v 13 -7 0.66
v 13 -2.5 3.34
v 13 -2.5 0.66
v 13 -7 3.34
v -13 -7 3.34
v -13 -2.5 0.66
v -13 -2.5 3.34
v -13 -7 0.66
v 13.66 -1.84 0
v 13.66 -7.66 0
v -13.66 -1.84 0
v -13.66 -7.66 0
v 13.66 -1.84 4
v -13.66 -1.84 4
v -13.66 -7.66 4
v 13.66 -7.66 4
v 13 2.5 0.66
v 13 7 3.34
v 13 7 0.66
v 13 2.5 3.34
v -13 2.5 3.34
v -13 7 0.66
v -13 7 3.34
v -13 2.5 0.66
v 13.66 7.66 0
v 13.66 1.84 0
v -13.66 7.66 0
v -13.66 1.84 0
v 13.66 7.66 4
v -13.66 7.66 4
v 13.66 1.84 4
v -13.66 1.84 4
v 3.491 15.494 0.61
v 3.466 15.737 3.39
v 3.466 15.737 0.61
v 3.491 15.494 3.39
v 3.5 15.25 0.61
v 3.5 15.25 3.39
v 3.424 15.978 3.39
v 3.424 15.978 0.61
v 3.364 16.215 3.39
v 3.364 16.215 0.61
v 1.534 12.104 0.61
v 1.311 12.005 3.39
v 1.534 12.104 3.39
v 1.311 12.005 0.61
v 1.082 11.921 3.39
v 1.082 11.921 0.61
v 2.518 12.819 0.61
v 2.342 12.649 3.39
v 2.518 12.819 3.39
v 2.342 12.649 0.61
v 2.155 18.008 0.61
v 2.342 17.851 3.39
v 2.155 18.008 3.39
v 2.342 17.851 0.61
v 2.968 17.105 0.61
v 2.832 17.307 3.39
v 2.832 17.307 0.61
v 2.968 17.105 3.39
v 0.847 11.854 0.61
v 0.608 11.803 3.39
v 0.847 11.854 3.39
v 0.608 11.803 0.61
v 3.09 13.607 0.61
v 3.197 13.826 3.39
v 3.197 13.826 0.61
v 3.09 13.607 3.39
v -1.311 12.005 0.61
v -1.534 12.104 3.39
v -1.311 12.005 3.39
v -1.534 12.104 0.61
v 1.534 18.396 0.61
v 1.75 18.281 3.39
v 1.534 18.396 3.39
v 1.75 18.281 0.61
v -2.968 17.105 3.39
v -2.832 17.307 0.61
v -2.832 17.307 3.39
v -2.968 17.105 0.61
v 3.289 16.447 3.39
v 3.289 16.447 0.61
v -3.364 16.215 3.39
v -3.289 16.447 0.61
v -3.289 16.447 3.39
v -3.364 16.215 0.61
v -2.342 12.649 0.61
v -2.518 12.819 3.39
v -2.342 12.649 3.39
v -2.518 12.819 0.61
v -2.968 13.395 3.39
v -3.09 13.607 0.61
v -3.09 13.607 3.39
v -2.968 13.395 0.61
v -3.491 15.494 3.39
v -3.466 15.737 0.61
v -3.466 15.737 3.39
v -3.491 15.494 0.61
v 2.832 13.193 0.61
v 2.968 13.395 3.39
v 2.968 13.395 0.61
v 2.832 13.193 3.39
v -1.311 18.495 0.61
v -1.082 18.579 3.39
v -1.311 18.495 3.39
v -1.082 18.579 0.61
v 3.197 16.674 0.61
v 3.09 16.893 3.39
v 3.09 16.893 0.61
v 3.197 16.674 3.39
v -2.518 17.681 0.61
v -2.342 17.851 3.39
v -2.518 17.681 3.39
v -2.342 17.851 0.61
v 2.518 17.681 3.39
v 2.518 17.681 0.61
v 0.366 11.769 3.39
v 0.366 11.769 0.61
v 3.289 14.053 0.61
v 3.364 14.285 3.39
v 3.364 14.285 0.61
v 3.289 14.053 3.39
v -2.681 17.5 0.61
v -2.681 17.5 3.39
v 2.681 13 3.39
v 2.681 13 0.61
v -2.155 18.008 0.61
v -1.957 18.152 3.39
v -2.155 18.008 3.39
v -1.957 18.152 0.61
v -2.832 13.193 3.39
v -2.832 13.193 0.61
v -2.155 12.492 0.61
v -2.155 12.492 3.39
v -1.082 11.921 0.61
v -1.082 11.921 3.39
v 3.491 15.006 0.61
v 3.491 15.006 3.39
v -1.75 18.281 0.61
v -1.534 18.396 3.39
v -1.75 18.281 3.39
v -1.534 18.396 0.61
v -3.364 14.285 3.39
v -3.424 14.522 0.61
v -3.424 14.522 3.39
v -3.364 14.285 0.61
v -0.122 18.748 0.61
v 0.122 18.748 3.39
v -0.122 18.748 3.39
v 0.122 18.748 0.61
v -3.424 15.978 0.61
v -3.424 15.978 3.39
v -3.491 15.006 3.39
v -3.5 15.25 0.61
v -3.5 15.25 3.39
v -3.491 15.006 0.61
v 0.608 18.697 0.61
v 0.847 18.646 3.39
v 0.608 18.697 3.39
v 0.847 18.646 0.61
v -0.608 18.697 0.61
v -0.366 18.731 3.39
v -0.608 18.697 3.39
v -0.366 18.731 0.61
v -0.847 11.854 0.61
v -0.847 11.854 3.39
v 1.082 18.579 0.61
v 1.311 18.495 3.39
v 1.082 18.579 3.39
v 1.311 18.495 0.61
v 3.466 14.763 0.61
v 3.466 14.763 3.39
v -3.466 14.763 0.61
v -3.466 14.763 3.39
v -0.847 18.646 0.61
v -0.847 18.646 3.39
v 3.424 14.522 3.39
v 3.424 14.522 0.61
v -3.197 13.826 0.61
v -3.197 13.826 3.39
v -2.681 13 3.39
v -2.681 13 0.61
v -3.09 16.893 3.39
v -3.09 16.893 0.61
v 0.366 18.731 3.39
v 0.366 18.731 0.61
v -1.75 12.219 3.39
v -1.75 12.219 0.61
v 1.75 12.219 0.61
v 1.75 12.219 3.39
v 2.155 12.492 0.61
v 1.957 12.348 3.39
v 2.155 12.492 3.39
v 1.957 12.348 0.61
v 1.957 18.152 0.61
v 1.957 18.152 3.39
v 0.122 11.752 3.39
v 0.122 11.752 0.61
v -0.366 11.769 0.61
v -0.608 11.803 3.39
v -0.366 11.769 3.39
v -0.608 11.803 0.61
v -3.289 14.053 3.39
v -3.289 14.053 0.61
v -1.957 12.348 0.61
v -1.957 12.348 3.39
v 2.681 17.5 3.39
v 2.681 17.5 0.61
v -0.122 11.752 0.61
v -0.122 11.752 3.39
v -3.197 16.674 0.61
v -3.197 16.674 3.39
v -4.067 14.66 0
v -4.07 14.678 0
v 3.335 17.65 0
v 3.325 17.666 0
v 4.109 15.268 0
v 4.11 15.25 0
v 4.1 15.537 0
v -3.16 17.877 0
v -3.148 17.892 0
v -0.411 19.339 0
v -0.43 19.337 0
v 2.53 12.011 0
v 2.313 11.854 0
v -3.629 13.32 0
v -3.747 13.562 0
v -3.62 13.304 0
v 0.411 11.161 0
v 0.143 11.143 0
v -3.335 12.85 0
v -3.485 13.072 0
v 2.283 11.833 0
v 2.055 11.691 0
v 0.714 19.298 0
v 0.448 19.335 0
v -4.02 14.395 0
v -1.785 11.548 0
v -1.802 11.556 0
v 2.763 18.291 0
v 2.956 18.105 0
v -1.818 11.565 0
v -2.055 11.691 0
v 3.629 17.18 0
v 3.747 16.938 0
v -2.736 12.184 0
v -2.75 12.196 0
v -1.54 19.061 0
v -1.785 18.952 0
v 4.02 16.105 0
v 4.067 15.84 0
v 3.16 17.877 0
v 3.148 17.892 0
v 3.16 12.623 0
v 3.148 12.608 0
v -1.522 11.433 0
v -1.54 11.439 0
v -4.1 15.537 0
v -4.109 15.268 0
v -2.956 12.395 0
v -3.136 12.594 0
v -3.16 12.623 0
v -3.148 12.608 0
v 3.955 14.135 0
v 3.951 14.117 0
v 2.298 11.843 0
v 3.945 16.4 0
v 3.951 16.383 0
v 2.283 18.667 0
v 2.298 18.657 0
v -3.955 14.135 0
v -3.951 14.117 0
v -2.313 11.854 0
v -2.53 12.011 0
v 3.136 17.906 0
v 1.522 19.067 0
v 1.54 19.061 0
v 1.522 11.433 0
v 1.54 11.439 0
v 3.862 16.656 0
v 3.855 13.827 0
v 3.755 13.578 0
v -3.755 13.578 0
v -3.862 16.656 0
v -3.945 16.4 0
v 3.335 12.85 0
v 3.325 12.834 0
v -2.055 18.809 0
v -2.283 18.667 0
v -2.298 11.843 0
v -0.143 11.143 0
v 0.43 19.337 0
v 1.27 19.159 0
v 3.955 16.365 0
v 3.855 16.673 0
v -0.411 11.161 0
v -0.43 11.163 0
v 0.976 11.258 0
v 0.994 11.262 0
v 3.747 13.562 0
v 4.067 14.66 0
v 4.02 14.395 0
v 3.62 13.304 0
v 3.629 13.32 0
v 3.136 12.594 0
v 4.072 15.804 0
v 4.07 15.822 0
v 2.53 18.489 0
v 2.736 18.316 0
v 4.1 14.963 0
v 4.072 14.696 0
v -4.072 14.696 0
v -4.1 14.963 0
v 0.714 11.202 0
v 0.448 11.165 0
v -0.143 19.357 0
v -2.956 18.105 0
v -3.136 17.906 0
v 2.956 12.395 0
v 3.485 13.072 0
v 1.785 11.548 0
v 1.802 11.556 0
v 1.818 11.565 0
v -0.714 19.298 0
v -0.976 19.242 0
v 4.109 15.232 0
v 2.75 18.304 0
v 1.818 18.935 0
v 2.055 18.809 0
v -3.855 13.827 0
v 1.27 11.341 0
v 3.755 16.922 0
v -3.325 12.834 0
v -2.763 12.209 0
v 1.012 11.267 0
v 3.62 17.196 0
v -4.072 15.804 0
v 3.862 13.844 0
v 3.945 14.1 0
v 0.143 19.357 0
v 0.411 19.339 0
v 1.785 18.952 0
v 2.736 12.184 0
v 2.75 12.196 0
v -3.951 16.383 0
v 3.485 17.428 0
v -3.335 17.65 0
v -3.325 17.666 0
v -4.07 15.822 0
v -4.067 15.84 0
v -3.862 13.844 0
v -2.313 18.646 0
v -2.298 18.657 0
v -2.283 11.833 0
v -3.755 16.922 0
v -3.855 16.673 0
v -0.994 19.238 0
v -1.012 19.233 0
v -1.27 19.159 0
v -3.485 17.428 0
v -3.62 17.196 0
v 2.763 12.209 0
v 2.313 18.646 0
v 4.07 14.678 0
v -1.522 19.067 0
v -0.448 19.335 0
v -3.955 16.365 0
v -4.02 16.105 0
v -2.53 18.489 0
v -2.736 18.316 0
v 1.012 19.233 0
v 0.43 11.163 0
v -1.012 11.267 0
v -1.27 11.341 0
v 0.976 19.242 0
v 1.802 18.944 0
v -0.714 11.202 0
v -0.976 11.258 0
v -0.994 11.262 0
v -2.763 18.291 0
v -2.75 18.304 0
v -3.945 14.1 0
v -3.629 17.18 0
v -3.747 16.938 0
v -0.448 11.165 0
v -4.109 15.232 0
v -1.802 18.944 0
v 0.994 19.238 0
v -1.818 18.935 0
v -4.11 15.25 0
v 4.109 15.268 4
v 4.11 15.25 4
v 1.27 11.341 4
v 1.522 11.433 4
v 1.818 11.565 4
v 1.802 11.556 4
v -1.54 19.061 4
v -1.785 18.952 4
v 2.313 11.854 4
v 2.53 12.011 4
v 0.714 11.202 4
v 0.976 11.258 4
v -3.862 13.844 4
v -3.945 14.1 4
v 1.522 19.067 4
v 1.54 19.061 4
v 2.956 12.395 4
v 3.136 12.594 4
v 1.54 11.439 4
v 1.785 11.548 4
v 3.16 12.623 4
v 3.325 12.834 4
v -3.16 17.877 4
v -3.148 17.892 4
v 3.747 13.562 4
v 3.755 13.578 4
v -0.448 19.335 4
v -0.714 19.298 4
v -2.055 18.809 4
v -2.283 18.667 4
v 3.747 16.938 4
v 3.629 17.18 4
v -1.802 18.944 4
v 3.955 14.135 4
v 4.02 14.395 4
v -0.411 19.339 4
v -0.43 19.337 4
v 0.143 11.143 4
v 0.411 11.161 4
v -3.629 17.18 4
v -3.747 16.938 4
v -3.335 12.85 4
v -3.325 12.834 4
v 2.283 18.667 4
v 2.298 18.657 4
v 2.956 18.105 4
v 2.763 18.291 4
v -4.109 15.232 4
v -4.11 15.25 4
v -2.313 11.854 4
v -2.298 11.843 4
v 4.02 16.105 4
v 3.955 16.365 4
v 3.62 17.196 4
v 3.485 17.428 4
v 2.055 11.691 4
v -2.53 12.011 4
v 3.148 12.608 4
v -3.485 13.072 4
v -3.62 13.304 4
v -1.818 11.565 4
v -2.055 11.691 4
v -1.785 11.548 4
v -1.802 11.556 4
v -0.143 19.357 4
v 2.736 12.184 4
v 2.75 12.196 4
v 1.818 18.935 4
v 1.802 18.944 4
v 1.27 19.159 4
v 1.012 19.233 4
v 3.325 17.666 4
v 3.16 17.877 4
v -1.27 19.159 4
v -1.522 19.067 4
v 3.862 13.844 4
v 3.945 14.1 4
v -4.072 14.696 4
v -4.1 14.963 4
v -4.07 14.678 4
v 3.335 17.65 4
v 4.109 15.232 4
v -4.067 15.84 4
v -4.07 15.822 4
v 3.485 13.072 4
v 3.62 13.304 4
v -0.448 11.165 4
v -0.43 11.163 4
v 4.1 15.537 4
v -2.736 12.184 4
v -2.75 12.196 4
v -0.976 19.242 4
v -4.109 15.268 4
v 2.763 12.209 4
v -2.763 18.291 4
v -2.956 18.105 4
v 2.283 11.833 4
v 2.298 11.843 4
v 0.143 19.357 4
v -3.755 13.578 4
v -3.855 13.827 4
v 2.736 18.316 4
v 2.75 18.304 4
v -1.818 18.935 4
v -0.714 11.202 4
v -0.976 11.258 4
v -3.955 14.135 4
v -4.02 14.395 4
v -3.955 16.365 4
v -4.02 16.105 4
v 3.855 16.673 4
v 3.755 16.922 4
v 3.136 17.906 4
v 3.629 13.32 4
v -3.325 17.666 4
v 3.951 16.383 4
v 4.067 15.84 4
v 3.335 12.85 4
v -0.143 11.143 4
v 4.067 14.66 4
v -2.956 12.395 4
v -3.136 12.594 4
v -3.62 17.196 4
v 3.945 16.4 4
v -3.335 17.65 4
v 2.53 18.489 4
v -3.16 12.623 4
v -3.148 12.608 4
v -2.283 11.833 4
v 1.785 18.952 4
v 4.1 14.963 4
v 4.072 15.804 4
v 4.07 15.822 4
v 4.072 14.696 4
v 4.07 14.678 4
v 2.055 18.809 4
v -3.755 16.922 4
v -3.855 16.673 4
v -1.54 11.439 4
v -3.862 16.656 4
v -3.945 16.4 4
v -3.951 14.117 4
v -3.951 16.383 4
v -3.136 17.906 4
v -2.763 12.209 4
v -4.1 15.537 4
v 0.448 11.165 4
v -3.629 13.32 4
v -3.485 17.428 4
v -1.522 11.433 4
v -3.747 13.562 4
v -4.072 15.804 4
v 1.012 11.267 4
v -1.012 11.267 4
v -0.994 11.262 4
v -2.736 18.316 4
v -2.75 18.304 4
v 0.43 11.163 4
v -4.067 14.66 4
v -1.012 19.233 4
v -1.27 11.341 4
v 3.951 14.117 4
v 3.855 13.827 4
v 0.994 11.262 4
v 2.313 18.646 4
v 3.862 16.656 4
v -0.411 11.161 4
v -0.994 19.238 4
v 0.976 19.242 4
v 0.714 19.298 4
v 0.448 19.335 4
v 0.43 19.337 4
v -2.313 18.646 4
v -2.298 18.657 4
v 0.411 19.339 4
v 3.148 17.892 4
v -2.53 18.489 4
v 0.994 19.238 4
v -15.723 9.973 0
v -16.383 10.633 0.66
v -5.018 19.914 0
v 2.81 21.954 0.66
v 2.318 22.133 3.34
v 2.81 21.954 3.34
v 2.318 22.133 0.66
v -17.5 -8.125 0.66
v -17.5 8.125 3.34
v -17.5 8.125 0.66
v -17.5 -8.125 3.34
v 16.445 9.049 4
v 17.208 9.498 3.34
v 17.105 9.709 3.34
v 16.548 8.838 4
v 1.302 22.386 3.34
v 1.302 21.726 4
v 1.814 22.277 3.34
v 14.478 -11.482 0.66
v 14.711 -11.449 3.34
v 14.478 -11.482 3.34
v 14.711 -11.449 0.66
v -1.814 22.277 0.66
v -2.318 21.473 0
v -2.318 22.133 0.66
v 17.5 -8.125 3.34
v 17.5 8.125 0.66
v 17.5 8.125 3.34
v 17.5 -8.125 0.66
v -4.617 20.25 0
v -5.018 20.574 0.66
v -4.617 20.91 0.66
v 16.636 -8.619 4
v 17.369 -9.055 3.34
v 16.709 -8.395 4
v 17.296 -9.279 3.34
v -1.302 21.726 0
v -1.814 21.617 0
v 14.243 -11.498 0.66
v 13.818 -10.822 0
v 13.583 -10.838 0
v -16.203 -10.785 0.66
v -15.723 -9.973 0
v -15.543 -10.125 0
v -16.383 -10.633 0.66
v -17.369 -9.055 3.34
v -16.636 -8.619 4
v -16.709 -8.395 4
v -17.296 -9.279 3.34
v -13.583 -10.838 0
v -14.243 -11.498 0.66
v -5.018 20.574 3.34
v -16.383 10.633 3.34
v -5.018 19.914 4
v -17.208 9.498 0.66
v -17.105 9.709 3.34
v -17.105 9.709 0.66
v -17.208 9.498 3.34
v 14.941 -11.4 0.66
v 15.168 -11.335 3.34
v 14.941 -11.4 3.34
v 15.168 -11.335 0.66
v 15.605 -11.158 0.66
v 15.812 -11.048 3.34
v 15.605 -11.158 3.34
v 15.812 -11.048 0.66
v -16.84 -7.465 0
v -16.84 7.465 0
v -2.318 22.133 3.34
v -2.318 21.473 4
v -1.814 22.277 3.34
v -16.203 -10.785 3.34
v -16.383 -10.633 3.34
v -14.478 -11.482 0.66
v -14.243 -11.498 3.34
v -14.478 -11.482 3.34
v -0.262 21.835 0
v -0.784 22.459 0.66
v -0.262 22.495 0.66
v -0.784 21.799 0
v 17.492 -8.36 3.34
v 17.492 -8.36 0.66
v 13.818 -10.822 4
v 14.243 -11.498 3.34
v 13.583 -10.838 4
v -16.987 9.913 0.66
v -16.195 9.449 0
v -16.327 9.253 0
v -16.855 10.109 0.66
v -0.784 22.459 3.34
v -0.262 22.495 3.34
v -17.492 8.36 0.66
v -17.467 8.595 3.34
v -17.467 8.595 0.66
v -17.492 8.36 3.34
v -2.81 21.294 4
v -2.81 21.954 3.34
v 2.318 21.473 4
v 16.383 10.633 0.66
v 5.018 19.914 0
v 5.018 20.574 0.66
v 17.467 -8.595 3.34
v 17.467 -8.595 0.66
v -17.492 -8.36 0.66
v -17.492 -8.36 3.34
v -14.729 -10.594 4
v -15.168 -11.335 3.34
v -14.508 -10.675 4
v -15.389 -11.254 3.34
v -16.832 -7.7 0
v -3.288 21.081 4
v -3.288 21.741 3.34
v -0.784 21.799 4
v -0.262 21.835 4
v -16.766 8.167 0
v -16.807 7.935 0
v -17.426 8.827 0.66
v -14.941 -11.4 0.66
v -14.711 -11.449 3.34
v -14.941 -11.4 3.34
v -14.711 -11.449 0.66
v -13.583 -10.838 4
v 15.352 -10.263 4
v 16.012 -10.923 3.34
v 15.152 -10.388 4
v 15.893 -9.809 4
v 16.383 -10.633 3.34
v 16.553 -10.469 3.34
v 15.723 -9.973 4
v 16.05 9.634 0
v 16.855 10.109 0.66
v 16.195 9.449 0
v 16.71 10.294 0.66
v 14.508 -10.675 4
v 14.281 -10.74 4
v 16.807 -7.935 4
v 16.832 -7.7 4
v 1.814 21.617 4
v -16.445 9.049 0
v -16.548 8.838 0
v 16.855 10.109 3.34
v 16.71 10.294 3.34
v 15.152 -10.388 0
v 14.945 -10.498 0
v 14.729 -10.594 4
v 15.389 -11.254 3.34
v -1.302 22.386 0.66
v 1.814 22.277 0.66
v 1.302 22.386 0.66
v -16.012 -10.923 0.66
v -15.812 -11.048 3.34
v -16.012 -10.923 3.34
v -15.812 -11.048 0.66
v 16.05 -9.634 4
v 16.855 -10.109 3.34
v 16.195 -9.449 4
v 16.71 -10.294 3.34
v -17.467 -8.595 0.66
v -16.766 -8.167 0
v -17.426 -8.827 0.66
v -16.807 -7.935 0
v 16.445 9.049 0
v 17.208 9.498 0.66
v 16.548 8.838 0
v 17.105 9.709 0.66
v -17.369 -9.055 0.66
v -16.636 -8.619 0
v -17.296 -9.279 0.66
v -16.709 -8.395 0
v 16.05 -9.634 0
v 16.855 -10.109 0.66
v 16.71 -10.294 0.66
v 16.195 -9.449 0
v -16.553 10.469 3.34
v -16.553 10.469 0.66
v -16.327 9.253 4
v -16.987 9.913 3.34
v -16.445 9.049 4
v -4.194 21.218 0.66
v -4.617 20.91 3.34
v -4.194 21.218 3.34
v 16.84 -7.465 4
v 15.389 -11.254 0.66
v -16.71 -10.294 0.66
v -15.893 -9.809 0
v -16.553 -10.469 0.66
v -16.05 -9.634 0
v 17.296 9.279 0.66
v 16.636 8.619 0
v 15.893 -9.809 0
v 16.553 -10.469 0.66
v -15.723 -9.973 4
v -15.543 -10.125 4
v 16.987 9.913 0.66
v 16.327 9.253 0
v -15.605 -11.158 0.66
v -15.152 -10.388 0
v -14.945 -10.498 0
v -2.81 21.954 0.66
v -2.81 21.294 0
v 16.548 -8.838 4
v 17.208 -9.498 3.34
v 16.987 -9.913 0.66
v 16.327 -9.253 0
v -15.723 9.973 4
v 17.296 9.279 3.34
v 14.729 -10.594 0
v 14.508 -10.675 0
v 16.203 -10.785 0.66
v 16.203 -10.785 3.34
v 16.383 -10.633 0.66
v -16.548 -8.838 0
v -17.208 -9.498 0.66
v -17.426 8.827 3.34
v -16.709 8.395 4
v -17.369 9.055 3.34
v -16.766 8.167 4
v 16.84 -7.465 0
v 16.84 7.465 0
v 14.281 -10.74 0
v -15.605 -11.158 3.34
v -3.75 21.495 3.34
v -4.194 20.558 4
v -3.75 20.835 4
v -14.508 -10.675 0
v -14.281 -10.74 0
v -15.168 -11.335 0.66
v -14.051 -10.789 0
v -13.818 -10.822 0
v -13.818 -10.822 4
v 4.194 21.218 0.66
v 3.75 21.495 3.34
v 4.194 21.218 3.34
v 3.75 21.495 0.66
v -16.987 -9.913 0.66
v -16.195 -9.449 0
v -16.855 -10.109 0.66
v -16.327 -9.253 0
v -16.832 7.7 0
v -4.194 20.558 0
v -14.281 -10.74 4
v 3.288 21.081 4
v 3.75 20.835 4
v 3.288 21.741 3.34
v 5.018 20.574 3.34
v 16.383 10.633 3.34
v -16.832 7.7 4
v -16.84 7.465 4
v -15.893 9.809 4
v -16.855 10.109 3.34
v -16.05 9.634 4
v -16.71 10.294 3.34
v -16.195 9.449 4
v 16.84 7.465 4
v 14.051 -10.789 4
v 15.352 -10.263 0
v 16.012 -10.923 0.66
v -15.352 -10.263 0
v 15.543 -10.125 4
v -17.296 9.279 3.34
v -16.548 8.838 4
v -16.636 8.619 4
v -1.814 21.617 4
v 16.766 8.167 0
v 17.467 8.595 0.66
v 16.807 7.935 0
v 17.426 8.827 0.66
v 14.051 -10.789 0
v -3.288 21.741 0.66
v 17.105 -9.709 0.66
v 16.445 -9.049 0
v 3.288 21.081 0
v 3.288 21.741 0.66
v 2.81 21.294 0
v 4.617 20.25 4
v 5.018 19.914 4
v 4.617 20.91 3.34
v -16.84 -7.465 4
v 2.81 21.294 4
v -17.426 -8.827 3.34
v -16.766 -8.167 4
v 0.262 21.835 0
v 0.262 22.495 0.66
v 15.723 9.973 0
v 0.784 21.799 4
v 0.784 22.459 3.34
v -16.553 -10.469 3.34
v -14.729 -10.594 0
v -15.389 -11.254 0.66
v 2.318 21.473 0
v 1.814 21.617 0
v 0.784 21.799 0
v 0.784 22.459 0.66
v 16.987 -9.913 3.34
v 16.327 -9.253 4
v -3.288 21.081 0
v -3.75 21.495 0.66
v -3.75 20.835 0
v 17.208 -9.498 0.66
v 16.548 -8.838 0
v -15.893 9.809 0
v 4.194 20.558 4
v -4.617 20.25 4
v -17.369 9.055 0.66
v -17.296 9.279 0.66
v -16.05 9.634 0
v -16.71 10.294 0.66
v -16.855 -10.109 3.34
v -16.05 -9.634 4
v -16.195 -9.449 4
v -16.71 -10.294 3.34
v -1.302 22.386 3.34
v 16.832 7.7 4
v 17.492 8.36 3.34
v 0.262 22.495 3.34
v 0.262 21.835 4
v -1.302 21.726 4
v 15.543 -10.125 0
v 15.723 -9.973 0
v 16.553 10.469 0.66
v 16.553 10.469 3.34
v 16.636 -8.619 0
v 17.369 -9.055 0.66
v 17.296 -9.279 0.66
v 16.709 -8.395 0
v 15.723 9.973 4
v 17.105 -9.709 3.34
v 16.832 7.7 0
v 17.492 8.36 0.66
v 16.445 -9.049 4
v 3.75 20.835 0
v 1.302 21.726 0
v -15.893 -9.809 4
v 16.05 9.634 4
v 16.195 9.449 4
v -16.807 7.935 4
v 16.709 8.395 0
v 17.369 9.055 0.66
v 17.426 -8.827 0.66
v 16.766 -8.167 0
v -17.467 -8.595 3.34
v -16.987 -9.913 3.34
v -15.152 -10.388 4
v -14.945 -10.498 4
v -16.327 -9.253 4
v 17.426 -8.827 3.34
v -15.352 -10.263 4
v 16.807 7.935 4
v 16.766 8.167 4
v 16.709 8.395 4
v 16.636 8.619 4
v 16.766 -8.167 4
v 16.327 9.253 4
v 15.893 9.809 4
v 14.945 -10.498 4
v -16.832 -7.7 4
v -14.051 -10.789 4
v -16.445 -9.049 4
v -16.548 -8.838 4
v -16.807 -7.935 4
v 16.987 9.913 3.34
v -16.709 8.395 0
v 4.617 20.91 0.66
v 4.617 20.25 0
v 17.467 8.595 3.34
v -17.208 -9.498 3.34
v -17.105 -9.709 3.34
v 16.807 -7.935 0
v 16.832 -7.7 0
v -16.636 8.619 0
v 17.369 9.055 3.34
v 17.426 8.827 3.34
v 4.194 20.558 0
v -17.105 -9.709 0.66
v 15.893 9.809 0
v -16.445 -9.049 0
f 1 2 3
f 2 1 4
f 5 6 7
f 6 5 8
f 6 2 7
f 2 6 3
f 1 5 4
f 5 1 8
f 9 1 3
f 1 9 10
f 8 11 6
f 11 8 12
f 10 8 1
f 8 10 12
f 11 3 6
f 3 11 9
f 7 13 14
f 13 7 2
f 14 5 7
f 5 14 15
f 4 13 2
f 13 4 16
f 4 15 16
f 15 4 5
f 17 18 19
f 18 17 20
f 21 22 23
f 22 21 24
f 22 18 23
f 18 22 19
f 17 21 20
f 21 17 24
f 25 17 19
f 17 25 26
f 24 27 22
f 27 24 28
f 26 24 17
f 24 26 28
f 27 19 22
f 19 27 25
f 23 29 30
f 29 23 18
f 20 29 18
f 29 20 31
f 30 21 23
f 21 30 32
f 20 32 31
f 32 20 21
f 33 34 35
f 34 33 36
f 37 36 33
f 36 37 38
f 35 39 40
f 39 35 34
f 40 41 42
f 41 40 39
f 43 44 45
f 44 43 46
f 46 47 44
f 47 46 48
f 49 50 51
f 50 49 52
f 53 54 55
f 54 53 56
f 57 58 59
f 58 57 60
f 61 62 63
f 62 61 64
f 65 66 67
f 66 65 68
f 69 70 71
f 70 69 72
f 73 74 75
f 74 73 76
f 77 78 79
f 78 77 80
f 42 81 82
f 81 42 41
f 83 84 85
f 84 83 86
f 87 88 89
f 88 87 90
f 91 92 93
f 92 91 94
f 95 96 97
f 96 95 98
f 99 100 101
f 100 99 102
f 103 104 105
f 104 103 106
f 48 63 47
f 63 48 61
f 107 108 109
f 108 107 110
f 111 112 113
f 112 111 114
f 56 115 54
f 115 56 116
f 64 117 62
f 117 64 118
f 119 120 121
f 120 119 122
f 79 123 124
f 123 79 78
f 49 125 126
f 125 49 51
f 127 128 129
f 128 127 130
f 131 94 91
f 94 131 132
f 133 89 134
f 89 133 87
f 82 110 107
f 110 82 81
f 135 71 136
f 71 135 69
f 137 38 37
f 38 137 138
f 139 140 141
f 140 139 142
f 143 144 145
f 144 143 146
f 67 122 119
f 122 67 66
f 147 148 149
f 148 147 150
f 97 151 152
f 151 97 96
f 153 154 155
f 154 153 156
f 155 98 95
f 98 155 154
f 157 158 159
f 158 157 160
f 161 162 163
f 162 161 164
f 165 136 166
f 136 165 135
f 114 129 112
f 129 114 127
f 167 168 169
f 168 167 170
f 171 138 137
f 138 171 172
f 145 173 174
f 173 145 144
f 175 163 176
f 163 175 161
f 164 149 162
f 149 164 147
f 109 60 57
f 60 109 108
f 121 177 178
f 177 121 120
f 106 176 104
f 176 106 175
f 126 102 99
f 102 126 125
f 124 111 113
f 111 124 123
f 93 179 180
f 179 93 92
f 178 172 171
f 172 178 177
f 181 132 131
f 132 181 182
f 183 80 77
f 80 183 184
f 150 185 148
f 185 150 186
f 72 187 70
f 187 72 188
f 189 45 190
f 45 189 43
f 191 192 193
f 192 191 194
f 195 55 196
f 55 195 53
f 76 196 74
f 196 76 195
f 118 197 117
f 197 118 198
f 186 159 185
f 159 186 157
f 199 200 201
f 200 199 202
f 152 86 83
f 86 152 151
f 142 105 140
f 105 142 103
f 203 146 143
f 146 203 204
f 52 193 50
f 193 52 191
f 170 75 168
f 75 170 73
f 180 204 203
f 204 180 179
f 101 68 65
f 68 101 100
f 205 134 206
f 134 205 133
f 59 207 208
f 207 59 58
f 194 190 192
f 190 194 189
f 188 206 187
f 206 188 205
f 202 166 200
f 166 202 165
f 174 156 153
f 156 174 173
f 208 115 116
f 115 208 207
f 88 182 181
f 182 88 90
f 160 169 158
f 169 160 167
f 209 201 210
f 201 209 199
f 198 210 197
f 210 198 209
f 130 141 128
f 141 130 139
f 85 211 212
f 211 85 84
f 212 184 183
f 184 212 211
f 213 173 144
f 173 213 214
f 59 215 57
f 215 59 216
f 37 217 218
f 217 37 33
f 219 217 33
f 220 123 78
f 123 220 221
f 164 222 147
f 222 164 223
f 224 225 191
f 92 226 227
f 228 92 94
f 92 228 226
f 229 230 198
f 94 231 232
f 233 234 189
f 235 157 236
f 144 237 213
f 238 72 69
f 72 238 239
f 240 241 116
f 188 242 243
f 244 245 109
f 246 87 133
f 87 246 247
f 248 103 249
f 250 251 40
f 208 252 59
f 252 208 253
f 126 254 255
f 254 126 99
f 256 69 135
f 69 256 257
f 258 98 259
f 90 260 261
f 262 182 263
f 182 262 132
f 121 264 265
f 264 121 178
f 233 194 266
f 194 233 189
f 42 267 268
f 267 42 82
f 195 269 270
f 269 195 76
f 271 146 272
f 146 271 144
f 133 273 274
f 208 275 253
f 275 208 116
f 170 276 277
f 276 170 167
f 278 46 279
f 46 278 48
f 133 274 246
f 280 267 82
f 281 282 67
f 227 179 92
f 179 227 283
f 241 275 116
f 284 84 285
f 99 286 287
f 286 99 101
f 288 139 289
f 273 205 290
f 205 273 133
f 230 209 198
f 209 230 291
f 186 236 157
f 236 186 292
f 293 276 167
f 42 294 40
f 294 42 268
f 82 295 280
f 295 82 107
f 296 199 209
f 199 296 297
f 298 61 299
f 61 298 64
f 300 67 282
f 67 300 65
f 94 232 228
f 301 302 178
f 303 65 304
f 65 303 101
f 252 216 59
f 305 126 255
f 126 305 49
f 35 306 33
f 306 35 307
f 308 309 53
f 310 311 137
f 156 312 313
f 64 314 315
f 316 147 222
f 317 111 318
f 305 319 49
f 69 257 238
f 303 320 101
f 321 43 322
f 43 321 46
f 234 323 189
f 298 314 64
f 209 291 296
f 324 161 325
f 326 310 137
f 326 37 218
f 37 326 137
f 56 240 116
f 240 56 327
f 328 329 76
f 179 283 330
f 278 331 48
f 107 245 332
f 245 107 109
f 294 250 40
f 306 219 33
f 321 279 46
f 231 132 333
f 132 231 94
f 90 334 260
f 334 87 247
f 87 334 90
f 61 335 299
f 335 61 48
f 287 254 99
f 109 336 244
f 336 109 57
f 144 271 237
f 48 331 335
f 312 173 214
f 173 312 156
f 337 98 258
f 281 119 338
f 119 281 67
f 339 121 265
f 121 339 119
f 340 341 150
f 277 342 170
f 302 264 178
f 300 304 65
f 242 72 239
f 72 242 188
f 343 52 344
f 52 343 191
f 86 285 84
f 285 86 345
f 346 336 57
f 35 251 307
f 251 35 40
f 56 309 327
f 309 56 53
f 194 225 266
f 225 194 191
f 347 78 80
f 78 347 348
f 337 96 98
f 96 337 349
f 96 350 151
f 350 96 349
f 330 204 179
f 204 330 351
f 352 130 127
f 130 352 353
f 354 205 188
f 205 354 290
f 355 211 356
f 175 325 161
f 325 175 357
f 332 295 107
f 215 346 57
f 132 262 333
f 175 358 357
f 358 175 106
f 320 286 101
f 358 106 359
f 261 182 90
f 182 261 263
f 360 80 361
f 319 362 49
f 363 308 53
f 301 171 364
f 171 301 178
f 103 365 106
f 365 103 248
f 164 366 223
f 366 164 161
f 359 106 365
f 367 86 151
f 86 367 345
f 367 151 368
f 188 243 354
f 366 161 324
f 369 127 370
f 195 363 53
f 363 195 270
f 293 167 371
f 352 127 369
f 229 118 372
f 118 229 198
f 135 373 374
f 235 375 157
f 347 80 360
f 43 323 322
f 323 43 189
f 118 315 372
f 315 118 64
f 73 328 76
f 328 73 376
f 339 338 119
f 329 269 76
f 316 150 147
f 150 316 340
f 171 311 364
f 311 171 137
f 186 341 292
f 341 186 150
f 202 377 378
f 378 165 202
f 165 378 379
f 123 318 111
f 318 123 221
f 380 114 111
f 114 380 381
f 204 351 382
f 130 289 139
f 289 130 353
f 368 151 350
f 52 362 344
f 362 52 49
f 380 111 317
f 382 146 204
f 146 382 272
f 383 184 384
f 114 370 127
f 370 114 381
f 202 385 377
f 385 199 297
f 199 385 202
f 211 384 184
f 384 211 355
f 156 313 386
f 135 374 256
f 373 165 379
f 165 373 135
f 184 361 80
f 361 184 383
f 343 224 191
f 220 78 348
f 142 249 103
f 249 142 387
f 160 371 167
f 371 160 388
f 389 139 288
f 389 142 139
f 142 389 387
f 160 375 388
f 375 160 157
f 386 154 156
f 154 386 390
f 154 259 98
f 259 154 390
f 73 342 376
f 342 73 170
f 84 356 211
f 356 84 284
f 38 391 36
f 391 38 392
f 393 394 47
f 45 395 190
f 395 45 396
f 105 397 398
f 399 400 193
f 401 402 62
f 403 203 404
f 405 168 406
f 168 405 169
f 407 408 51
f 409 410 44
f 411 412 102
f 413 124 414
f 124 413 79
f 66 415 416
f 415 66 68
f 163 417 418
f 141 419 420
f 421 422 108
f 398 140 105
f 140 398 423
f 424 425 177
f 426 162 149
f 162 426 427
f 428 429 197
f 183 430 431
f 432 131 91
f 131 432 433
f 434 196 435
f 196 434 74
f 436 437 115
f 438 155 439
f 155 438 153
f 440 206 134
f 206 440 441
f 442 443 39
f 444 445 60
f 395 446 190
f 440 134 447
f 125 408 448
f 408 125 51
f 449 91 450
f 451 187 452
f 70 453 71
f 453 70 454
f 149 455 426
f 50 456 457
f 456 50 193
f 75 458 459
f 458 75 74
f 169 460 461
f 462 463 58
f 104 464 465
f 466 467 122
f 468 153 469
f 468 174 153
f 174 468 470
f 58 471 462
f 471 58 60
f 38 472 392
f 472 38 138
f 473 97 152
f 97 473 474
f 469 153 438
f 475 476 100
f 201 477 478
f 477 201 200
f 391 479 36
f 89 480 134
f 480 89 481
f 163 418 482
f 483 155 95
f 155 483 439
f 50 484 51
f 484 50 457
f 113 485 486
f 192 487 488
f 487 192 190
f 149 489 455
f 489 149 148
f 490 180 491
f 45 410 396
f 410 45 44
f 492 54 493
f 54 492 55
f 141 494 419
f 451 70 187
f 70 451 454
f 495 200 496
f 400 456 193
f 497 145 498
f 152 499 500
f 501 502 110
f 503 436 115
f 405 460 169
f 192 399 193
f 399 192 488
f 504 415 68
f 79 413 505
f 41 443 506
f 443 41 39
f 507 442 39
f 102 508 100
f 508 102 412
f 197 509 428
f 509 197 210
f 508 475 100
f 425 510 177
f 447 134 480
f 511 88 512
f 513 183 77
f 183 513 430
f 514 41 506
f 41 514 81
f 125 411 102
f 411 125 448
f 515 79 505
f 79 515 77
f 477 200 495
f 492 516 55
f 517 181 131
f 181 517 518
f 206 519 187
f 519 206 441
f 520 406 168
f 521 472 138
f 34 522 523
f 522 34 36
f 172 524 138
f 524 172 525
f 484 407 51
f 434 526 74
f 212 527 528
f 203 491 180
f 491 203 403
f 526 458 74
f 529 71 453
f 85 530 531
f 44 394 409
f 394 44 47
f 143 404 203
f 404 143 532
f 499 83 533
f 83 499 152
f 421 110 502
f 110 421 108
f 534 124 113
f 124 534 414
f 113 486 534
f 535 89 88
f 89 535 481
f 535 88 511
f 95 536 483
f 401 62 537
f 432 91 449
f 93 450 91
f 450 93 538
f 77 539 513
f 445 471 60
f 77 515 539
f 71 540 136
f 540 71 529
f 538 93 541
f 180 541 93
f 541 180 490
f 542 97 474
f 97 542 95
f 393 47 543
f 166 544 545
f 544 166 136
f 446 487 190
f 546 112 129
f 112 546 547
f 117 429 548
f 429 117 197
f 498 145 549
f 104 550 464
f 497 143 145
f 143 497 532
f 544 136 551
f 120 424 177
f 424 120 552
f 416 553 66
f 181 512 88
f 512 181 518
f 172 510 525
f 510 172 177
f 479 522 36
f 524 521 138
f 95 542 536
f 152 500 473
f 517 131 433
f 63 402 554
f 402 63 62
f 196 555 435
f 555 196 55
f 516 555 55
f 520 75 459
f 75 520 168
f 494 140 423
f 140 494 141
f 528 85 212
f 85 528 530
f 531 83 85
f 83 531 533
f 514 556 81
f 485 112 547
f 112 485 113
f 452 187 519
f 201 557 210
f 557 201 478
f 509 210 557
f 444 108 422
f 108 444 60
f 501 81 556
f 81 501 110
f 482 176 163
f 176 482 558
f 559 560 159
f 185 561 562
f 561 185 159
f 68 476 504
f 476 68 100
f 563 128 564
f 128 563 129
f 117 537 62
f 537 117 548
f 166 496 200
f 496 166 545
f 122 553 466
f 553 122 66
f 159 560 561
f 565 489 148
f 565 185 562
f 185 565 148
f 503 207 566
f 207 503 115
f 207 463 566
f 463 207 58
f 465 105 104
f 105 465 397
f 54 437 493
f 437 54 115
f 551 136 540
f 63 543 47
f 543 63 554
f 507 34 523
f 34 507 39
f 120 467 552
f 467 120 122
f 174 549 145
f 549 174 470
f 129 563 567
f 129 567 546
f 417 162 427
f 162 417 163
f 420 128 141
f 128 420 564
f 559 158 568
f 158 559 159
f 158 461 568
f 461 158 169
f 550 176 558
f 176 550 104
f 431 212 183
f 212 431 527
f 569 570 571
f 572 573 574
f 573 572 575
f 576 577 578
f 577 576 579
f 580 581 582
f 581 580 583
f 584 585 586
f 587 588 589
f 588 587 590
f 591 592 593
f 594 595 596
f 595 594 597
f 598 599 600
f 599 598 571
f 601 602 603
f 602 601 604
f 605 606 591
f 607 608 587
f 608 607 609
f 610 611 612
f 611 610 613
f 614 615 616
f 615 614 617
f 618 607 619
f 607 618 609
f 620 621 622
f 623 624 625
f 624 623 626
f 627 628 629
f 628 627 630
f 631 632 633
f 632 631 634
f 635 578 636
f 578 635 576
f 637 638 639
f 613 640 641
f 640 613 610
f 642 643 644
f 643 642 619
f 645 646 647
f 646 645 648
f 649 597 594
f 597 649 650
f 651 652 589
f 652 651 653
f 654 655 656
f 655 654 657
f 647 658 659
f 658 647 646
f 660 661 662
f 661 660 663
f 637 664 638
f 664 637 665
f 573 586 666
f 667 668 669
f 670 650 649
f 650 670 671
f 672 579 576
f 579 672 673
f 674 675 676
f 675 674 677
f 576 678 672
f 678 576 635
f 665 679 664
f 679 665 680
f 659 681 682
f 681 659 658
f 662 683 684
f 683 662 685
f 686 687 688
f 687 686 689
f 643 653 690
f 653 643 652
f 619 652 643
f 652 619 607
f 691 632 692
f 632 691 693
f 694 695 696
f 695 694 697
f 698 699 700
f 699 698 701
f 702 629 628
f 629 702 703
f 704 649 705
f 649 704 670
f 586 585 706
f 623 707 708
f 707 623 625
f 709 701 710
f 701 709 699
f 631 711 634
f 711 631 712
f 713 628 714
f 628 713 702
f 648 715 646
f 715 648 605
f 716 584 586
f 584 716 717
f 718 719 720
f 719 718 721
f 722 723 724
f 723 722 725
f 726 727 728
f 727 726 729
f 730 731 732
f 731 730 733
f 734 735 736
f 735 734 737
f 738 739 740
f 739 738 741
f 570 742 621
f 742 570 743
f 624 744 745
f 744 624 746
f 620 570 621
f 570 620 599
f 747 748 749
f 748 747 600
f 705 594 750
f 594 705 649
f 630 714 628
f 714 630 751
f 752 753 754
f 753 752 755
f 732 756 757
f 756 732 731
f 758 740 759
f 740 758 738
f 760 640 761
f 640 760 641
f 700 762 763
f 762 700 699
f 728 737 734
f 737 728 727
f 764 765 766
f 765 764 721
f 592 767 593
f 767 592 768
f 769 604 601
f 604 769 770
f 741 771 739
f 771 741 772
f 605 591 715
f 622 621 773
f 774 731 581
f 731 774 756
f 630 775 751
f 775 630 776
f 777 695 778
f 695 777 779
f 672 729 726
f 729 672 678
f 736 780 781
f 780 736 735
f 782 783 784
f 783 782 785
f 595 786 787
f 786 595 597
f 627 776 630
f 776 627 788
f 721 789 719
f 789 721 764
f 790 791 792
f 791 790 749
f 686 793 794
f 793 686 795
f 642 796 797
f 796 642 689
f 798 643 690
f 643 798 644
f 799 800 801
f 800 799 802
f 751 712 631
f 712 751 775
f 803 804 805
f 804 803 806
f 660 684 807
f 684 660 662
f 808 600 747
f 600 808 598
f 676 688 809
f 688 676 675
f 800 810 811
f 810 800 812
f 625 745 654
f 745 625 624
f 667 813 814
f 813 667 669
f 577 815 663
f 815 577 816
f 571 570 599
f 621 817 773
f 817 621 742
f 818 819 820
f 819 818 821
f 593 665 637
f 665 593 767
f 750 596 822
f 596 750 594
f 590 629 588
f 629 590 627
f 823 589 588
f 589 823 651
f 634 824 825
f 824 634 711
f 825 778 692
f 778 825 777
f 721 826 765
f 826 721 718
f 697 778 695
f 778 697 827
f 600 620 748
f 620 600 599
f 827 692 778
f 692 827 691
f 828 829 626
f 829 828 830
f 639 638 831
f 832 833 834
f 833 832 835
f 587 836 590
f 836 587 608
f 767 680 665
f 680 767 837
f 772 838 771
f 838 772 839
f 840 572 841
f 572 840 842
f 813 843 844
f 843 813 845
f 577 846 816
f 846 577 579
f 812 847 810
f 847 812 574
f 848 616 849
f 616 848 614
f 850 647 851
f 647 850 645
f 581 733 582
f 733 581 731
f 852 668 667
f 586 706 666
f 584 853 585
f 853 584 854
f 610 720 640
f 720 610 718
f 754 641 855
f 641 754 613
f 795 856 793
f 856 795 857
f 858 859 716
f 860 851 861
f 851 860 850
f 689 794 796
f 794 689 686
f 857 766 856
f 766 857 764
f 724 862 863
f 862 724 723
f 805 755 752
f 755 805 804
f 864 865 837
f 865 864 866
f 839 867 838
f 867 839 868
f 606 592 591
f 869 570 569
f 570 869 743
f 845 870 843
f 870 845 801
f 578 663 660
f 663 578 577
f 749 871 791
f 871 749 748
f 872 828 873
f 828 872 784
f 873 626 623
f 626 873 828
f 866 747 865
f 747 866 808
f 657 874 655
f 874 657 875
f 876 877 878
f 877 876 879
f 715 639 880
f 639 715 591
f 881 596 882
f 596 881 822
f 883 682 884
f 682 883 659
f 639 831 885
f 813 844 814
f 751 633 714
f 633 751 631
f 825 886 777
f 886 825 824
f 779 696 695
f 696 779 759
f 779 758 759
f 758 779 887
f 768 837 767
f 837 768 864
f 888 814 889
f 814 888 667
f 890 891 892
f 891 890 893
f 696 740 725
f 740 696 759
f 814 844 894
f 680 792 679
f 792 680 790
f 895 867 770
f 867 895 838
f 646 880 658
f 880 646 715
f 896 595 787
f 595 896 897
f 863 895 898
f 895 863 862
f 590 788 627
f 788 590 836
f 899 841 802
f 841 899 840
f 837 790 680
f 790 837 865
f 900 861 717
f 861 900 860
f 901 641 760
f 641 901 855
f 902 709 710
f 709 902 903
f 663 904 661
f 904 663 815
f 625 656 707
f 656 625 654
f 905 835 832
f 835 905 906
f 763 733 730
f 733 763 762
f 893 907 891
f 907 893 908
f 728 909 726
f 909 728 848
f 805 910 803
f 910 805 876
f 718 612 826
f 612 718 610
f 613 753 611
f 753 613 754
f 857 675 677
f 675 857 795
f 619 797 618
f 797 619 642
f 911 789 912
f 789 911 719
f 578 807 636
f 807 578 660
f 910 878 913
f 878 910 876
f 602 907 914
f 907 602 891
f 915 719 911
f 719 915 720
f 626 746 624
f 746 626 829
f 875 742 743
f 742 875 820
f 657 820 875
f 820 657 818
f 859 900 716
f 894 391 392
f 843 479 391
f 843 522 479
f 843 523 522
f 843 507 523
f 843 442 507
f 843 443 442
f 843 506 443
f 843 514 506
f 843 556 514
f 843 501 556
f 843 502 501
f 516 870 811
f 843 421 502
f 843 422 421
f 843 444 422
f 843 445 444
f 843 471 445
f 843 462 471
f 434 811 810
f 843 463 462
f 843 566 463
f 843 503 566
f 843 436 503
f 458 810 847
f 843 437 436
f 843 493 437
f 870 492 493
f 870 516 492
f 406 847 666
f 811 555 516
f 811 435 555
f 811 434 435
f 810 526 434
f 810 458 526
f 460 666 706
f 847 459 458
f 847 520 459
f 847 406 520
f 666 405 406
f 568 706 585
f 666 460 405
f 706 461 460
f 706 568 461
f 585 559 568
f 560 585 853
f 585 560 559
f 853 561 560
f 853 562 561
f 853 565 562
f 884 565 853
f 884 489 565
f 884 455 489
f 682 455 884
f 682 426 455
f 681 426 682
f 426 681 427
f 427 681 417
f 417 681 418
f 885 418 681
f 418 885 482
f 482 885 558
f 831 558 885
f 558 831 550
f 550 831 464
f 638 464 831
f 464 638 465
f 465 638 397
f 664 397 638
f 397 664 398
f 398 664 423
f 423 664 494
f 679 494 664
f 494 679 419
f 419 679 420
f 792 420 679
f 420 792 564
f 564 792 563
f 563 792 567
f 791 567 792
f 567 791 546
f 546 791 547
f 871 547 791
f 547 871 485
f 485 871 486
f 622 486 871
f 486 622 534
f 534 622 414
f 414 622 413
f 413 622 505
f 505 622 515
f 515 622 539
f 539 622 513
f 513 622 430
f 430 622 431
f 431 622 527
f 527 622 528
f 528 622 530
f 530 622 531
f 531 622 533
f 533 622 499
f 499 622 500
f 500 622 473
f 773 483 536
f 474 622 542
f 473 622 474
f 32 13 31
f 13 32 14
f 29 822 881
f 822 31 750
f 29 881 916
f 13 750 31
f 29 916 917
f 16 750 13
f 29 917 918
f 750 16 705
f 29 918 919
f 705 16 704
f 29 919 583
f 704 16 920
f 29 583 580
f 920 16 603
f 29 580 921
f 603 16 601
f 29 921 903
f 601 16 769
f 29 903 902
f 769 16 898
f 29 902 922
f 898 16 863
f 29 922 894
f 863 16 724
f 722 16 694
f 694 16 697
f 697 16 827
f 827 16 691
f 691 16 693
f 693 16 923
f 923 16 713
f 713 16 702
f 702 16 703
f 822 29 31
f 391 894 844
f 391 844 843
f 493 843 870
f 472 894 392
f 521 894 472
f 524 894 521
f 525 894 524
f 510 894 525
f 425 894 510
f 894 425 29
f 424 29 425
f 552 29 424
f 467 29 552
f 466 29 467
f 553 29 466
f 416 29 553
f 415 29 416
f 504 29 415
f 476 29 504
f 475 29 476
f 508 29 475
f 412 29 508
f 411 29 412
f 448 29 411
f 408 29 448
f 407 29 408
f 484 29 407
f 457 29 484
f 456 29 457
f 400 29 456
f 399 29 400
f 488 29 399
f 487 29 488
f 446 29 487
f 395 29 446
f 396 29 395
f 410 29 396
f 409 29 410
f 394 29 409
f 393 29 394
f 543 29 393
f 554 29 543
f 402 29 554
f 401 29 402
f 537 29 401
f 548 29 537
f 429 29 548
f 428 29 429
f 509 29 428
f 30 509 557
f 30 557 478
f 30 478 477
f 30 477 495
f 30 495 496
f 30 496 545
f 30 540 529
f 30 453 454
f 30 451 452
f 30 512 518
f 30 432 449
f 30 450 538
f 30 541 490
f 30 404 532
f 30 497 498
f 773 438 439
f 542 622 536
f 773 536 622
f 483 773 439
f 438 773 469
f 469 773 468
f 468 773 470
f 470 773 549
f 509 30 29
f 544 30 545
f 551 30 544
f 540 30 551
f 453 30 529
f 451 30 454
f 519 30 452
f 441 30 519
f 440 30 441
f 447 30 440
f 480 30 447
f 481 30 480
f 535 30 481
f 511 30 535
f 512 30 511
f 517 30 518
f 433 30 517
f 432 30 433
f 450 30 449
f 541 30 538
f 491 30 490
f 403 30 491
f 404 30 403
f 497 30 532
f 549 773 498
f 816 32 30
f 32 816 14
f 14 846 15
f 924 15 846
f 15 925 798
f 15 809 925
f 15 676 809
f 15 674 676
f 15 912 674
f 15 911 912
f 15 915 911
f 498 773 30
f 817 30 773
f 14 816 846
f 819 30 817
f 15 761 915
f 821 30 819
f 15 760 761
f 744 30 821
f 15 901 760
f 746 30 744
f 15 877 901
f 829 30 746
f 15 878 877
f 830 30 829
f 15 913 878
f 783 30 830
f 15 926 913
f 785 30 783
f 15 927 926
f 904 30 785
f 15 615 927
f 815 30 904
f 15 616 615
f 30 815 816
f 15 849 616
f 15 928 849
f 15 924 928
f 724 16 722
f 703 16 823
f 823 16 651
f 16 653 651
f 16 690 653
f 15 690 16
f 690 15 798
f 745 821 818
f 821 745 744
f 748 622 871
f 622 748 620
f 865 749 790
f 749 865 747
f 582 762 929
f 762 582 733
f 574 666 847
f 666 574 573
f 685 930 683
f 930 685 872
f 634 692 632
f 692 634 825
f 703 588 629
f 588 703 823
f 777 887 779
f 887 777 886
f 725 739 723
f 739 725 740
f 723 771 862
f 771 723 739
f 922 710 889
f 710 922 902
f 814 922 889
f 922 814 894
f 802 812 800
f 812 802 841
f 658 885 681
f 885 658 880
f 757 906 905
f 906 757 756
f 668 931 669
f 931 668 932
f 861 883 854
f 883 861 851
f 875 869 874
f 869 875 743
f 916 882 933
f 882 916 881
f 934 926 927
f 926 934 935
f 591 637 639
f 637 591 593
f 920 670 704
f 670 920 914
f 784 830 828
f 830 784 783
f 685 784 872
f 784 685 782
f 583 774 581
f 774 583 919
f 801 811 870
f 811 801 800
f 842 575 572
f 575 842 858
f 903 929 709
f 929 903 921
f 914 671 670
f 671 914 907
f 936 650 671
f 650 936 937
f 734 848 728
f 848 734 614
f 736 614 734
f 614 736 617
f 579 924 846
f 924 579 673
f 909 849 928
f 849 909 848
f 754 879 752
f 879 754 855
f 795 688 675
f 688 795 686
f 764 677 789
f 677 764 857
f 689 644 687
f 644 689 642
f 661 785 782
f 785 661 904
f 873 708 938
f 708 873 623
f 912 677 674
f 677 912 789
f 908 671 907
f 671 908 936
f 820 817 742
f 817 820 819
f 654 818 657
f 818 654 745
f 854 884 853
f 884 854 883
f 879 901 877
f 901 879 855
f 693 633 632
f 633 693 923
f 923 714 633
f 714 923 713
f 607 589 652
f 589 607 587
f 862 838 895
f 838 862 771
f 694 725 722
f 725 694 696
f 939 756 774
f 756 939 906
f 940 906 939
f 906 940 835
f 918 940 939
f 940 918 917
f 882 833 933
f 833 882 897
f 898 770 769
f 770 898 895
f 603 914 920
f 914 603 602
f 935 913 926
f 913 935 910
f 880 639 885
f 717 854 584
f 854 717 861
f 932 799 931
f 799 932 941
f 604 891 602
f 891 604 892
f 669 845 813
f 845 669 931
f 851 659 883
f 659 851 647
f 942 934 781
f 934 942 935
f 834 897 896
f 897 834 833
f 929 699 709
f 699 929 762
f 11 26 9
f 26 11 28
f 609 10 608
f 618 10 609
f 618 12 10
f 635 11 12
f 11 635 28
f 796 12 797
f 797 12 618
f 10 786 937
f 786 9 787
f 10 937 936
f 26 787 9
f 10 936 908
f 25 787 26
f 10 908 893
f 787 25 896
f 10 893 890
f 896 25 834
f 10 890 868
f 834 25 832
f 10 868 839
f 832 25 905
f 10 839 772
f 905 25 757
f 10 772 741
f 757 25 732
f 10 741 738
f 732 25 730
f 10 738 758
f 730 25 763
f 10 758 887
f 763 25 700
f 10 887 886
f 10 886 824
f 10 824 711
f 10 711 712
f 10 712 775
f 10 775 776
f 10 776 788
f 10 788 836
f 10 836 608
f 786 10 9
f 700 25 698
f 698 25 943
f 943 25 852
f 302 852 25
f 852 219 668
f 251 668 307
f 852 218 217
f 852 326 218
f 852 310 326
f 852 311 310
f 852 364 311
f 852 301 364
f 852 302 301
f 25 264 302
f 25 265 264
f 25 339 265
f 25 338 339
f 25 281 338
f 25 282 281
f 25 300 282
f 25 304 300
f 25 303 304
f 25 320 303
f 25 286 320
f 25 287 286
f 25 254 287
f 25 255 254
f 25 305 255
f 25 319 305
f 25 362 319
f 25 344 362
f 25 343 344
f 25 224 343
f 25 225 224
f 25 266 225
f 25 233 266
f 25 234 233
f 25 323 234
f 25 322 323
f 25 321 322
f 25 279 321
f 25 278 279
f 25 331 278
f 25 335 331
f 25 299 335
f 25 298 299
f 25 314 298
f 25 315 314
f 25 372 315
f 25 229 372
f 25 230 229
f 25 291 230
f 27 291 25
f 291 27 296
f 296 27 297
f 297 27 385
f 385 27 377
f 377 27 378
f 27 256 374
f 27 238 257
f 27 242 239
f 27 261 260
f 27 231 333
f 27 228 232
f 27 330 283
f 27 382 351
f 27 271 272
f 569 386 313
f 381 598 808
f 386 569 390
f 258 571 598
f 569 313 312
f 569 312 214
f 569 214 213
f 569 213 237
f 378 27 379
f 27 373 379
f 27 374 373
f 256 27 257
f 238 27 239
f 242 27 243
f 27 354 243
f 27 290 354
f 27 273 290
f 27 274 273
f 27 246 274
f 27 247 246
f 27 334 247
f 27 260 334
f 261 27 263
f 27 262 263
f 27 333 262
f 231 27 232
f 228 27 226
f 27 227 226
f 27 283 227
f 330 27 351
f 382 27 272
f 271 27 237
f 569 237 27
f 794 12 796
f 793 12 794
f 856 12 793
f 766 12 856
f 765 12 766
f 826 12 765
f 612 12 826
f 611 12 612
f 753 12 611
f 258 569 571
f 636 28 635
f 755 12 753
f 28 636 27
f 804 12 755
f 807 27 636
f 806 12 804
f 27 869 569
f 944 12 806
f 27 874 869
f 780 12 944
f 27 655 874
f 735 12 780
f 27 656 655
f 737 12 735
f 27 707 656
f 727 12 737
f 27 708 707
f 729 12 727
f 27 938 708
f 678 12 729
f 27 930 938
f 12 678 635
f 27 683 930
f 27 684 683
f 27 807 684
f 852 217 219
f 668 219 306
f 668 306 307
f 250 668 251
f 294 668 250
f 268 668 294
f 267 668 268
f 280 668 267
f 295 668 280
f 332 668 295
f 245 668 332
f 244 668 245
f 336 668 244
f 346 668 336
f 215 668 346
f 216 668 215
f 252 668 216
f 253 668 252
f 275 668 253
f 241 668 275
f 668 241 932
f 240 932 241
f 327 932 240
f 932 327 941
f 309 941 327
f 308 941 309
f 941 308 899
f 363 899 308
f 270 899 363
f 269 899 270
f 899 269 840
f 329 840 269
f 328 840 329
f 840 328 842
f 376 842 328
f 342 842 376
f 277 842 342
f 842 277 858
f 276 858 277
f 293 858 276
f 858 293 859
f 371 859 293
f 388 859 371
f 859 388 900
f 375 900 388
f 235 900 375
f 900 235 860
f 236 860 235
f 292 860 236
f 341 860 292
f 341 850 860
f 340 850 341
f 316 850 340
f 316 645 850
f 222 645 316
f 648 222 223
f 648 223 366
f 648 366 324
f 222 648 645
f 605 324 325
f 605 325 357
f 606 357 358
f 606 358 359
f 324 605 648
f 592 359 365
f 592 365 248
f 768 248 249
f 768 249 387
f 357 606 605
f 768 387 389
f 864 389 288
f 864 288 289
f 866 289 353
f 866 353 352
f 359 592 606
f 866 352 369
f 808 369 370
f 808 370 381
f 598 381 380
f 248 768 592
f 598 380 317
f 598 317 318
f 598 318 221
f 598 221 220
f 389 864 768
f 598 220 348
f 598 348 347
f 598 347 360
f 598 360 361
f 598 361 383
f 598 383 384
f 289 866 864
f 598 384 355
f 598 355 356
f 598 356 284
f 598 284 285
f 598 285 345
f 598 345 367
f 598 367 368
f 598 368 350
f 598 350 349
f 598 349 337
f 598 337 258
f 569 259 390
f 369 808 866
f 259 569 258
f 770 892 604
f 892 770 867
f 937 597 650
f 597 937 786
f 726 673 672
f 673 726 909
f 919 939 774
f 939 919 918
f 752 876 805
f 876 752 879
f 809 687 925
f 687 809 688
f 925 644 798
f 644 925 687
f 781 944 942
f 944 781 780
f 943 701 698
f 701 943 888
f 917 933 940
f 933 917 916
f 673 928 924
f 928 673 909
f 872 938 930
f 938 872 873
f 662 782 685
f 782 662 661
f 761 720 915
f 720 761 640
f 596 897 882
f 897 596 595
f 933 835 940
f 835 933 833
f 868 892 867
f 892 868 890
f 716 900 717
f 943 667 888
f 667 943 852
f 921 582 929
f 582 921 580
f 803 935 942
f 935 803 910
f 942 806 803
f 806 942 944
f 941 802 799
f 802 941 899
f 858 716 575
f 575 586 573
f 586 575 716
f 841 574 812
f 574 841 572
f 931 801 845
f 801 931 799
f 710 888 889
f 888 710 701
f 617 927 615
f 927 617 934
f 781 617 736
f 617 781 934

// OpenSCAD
//=== Flat Tri Glide ===//

//width of the webbing opening (1in = 25.4 mm)
_1_webbingWidth = 26;

// width of the gap for the webbing
_2_webbingGap = 4.5;

// thickness of the edge
_3_edgeThickness = 4.5;

// thickness of the center beam
_4_centerThickness = 5;

// height of the tri glide
_5_height = 4;

// percent corner rounding
_6_cornerRounding = 75; // [1:100]

// ho much to break off the edges
_7_cornerBreakage = 0.66;

// diameter of eyelet
_8_eyeDiameter = 7;

// thicknes of the eyelets rim
_9_eyeRimThickness = 4;




module makeBody(xsize, ysize, height, radius,edgeThickness,eyeRad,eyeRim) {
	translate([0,0,height/2]) {
		minkowski() {
			cube(size=[xsize-2*radius,ysize-2*radius, height/2], center = true);
			cylinder(r=radius, h=height/2, center=true);
		}
	}
	translate([0,ysize/2+eyeRad,0]) 
		cylinder(r=eyeRad+eyeRim,h=height);
}

module makeCuts(width, gap, thickness, height,b,eyeRad,eyeRim) {
    eps=0.05;
	offset = (thickness+gap)/2;
	for (y = [-offset, offset]) {
		translate([0, y, 0]) {

			translate([0, 0, height/2])
				cube(size=[width, gap, height*2], center=true);
			translate([0, 0, 0])
				makeCutEnd(width, gap, thickness, height,b);
			translate([0, 0, height]) scale([1,1,-1])
				makeCutEnd(width, gap, thickness, height,b);
		}
	translate([0,2*offset+gap/2 +eyeRad,-height*0.1]) 
		cylinder(r=eyeRad,h=height*1.2);
	translate([0,2*offset+gap/2 +eyeRad,-eps]) 
		cylinder(r1=eyeRad+b,r2=eyeRad,h=b);
	translate([0,2*offset+gap/2 +eyeRad,height-b+eps]) 
		cylinder(r1=eyeRad,r2=eyeRad+b,h=b);
	}
}

module makeCutEnd(width, gap, thickness, height,b)
{
	hull(){
		translate([0,0,+b/2])
			cube(size=[width, gap, b], center=true);
		translate([0,0,-b/2])
			cube(size=[width+2*b, gap+2*b, b], center=true);			
	}
}

module makeTriGlide(width, gap, edgeThickness, centerThickness, height, rounding, 
                    b, eyeDiam, eyeRim ,$fn=90) {
	xsize = width + edgeThickness * 2;
	ysize = centerThickness + edgeThickness * 2 + gap * 2;
	radius = edgeThickness*(rounding/100);
	difference() {
        hull()
        {
		  makeBody(xsize-2*b, ysize-2*b, height, radius,edgeThickness,eyeDiam/2,eyeRim);
          translate([0,0,b])
		  makeBody(xsize, ysize, height-2*b, radius,edgeThickness,eyeDiam/2,eyeRim);
        }
		makeCuts(width, gap, centerThickness, height,b,eyeDiam/2,eyeRim);
	}
}


makeTriGlide(_1_webbingWidth, _2_webbingGap, _3_edgeThickness, _4_centerThickness, _5_height, _6_cornerRounding,_7_cornerBreakage,_8_eyeDiameter,_9_eyeRimThickness);
